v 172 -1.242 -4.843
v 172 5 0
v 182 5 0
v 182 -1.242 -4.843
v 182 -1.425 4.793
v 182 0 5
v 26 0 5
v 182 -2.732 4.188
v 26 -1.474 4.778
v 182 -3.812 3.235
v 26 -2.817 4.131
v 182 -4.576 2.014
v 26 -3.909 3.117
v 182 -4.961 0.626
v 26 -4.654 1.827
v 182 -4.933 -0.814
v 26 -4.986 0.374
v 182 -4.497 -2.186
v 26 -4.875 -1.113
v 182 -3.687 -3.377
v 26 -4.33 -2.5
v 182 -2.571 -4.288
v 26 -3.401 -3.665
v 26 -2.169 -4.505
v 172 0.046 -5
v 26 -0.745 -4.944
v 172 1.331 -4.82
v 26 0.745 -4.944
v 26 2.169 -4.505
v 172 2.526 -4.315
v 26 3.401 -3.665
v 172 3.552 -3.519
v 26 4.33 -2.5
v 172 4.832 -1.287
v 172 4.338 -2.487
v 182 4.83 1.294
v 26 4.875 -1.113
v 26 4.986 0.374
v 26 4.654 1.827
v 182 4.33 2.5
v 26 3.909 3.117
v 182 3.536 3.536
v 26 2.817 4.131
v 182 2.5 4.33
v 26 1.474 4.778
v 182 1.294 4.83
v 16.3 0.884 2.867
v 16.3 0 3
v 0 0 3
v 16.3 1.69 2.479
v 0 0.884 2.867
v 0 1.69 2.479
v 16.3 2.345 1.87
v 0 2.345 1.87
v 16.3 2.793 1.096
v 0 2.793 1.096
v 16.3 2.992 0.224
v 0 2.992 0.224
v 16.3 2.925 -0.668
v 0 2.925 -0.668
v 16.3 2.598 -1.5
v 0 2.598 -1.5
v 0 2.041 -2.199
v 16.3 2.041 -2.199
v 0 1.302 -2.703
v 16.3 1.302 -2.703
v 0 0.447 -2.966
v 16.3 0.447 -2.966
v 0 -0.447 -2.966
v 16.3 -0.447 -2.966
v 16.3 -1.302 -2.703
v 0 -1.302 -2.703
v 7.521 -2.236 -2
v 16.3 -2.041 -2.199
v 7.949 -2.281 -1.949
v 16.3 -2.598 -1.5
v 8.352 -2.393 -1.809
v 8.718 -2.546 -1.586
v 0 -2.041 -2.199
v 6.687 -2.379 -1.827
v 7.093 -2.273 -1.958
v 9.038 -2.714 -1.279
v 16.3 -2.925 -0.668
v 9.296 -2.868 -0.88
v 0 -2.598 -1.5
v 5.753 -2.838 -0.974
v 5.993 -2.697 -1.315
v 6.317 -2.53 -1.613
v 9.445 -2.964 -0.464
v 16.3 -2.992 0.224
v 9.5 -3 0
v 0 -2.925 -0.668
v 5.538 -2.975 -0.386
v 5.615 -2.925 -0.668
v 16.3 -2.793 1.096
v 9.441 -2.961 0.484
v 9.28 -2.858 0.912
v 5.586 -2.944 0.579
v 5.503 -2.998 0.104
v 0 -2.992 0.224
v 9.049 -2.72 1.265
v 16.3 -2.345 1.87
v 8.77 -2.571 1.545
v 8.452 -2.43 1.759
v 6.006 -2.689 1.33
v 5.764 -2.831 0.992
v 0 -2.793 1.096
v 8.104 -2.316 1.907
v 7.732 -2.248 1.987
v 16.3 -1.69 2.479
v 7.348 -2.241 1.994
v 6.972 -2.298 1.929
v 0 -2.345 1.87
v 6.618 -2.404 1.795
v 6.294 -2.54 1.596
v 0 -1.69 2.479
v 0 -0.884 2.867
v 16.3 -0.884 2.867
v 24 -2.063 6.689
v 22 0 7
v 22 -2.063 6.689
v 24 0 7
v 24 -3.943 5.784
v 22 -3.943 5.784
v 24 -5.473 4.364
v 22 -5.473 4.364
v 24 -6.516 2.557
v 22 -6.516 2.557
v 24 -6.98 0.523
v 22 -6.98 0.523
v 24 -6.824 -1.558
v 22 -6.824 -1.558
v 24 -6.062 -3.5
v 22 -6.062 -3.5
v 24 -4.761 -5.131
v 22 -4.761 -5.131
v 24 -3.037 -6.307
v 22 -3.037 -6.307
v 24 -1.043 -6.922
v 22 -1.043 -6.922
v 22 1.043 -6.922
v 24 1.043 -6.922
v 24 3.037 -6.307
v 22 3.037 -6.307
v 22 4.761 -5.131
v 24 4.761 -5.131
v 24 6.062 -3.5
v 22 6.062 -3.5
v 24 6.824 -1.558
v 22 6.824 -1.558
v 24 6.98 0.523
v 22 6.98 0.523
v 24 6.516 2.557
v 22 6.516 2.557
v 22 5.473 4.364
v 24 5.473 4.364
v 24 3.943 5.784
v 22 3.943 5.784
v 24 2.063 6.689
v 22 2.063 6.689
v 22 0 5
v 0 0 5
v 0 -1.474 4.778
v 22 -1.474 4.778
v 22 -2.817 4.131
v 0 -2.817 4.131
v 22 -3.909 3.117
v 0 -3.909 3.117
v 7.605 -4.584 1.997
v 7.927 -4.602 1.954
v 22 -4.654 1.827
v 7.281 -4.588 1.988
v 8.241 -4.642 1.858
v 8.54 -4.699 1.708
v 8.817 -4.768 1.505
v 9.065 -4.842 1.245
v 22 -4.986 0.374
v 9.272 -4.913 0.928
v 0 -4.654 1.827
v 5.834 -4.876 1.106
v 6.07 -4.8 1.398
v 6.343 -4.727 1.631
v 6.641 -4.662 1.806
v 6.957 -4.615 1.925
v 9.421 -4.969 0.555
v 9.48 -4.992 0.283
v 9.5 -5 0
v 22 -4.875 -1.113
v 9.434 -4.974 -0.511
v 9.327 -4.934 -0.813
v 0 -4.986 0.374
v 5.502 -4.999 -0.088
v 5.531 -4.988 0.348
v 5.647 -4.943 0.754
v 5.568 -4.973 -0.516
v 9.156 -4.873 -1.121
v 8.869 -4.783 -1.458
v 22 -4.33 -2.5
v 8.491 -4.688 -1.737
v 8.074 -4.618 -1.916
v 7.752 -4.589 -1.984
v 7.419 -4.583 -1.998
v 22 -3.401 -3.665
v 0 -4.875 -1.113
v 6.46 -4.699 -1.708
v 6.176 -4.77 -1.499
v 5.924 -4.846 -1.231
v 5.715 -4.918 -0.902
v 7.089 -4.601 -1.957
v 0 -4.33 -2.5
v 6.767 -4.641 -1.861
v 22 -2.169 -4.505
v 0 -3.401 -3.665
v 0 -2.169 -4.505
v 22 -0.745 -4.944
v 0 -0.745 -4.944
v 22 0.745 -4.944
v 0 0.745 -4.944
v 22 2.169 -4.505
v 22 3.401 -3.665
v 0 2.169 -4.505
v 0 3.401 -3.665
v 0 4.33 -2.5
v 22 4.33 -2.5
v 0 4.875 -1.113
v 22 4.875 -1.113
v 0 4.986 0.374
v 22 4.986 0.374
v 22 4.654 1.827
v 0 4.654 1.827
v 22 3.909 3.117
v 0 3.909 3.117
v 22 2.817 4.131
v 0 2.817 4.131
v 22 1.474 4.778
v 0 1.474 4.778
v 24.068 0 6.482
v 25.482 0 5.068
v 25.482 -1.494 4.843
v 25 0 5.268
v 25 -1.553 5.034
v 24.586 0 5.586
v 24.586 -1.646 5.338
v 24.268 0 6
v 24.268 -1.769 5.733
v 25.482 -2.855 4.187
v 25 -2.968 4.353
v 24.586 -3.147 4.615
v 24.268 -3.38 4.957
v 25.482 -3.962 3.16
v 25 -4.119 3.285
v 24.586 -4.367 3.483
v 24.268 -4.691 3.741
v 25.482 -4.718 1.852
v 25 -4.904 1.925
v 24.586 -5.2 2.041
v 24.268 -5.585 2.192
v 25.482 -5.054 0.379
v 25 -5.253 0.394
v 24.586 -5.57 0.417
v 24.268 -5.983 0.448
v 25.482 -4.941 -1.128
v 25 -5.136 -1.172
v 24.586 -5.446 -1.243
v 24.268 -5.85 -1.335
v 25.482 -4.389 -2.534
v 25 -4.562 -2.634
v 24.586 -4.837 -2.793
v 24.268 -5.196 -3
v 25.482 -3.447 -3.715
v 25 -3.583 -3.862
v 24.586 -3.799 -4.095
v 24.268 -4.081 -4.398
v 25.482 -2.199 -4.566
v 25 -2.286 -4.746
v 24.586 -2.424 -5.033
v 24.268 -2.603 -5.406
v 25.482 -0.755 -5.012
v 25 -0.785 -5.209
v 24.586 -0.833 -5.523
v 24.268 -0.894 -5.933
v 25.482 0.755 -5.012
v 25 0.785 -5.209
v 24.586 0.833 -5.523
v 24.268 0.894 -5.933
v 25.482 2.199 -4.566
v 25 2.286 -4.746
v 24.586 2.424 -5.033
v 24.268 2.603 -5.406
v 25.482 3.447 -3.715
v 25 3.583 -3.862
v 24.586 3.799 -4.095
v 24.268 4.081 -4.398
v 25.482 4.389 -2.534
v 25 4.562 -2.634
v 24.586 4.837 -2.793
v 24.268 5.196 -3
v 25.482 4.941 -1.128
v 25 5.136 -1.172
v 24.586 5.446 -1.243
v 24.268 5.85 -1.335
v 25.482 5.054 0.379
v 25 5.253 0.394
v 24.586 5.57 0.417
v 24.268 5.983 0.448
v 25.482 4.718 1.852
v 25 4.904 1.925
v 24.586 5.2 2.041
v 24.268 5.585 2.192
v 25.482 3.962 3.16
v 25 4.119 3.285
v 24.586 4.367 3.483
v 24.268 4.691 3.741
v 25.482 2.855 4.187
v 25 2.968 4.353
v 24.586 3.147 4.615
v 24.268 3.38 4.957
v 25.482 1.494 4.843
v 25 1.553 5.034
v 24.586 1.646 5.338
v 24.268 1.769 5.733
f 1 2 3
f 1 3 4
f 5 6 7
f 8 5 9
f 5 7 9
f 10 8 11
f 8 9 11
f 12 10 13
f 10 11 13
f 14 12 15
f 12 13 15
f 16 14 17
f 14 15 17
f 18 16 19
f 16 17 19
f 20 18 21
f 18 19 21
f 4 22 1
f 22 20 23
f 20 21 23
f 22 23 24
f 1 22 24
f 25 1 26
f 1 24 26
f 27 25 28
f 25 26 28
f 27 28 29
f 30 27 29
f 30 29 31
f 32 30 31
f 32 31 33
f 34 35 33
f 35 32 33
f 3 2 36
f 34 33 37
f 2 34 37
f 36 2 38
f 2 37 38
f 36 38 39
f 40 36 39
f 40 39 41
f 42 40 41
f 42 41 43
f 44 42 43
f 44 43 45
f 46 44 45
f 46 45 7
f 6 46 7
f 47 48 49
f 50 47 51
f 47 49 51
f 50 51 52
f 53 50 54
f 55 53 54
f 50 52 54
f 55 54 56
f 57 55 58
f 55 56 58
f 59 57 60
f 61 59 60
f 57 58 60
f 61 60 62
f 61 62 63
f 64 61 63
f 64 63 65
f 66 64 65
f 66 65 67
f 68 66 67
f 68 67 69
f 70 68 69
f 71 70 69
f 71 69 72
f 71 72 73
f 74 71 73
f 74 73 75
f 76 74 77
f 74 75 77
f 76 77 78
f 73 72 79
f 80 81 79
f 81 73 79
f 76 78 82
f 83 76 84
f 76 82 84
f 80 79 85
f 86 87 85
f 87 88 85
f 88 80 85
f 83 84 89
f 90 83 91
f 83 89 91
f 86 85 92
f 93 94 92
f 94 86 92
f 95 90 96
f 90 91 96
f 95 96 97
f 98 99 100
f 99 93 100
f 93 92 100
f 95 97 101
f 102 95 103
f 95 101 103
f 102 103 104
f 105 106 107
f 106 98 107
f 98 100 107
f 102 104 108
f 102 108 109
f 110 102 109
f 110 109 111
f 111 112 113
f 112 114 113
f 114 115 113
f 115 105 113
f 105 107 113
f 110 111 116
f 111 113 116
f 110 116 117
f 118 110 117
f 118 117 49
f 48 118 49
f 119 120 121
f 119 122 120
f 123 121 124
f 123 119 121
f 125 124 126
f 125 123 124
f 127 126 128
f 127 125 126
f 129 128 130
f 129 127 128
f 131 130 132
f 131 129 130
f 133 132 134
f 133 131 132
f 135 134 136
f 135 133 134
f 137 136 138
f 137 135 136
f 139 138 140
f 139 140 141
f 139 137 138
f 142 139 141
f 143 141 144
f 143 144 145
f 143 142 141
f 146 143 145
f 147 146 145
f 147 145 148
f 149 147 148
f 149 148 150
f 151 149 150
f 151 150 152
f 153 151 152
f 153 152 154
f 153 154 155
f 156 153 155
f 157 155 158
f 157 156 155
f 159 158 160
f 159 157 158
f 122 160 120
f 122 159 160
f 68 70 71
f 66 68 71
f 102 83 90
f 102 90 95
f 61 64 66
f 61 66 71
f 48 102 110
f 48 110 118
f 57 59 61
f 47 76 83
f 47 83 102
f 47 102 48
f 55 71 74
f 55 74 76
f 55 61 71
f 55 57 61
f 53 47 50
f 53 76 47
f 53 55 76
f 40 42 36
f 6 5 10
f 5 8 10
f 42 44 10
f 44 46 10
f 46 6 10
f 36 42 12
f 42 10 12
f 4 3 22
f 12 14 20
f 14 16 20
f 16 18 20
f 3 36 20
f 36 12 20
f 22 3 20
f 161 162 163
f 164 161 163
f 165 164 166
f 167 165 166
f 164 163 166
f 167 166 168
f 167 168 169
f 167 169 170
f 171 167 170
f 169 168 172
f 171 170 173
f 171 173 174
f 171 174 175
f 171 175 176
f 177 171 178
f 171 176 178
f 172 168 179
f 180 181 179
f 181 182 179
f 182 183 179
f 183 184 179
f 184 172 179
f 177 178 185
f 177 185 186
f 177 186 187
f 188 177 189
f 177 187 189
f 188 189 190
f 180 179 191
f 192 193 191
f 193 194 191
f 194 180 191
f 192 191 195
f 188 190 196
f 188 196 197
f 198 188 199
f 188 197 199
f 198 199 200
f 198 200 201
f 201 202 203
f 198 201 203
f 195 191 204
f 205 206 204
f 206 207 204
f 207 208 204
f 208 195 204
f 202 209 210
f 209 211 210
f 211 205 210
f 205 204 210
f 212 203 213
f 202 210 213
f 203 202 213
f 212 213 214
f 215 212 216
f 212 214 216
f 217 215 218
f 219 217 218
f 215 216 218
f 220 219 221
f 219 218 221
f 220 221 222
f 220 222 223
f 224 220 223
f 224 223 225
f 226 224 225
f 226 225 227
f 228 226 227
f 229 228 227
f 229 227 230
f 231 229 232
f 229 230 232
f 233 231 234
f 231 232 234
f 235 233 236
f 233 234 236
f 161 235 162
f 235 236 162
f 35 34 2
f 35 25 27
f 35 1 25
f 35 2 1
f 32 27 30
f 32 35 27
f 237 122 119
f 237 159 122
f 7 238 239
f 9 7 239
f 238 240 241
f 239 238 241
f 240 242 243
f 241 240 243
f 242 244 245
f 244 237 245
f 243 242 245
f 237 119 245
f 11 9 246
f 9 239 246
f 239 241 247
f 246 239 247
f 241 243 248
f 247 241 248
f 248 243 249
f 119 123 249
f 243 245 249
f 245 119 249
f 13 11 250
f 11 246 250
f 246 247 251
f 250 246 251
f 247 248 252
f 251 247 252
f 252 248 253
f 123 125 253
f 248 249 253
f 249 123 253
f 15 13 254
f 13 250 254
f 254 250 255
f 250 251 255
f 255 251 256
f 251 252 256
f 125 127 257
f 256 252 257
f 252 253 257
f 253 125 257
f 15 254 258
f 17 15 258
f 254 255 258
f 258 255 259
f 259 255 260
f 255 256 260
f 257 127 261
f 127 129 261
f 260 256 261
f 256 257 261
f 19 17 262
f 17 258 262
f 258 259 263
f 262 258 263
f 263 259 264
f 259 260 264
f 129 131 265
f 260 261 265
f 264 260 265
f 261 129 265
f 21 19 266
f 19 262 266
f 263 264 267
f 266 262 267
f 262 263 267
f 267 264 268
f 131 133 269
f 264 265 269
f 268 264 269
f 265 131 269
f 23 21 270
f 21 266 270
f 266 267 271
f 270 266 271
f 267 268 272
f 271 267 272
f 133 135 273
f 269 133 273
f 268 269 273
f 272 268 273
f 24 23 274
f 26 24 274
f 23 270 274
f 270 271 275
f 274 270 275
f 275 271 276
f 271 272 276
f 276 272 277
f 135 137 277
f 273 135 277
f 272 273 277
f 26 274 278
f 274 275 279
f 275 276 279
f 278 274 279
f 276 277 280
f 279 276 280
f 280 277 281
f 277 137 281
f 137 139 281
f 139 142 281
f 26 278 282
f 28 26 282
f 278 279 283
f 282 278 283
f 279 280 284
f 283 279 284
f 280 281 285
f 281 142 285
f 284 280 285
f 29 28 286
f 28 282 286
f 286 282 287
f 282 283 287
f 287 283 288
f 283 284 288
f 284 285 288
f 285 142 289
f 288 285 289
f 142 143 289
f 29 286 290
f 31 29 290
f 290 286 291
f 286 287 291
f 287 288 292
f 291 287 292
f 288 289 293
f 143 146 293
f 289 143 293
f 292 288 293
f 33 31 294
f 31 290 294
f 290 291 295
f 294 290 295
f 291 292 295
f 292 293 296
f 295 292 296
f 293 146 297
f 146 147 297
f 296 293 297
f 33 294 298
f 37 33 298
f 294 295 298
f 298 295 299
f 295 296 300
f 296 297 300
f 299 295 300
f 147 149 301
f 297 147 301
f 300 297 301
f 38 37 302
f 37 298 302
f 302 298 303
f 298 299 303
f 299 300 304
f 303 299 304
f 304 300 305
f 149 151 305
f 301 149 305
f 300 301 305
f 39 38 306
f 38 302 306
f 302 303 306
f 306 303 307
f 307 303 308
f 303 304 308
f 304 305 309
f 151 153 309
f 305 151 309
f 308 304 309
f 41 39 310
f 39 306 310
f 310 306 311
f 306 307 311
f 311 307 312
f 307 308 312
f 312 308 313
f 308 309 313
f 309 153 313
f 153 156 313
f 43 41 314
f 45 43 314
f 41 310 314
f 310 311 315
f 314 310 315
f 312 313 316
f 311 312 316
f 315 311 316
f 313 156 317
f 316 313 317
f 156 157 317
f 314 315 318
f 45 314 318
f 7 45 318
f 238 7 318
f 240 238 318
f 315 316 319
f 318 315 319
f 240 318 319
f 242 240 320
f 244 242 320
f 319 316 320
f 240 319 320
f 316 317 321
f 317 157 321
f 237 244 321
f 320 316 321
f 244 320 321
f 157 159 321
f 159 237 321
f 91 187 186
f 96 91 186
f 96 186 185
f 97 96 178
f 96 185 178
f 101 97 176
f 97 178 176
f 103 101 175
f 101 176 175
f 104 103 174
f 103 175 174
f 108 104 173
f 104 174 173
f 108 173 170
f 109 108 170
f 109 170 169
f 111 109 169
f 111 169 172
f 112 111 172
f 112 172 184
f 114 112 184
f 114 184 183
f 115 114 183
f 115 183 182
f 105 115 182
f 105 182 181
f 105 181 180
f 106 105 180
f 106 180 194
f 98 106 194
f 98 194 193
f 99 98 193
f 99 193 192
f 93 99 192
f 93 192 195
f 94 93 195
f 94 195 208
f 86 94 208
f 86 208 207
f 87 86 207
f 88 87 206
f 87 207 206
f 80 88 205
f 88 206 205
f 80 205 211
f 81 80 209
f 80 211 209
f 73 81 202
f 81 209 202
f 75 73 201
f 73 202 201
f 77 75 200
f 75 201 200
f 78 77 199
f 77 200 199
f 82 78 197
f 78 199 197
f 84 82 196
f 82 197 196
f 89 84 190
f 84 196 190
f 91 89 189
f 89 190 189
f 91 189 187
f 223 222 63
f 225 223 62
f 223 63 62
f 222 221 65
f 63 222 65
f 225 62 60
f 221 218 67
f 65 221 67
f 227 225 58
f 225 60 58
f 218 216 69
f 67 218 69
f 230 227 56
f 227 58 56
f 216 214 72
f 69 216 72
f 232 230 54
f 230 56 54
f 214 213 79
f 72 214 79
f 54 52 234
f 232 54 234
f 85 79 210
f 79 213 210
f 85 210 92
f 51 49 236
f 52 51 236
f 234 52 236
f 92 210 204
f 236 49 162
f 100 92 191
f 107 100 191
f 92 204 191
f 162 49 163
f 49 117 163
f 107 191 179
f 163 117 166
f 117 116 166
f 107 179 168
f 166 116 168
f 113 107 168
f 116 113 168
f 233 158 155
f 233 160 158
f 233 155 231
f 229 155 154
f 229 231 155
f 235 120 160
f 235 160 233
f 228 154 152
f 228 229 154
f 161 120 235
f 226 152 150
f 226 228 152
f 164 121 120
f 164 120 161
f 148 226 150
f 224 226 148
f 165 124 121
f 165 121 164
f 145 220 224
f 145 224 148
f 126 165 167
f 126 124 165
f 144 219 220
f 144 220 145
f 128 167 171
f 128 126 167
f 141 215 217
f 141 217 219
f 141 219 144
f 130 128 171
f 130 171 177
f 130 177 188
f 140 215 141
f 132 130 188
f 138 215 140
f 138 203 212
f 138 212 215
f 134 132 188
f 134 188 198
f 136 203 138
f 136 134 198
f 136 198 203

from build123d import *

# Parameters (mm, degrees)
ESQUISSE1_W                  = 36
ESQUISSE1_H                  = 5
ESQUISSE1_W_2                = 2
ESQUISSE1_H_2                = 2
CONG_1_R                     = 2
ESQUISSE6_R                  = 2
ENL_V_MAT_EXTRU_2_DEPTH      = 5
ESQUISSE7_R                  = 3
ENL_V_MAT_EXTRU_3_DEPTH      = 16.3
ENL_V_MAT_EXTRU_4_DEPTH      = 183.269032028
ENL_V_MAT_EXTRU_4_DEPTH_BACK = 10


with BuildPart() as part:
    # Esquisse1 → Révolution1 (revolve)
    with BuildSketch(Plane.XY, mode=Mode.PRIVATE) as r_volution1_sk:
        Polygon((0, 5), (0, 0), (146, 0), (146, 5), (24, 5), (22, 5), align=None)
        with Locations((164, 2.5)):
            Rectangle(ESQUISSE1_W, ESQUISSE1_H)
        with Locations((23, 6)):
            Rectangle(ESQUISSE1_W_2, ESQUISSE1_H_2)
    revolve(r_volution1_sk.sketch.rotate(Axis((-22.396751432, 0, 0), (1, 0, 0)), 90), axis=Axis((-22.396751432, 0, 0), (1, 0, 0)))

    # Congé1
    cong_1_edges = [part.edges().sort_by_distance(p)[0] for p in [
        (24, 0, -5),
    ]]
    fillet(cong_1_edges, radius=CONG_1_R - 0.0001)  # a hair under: the kernel refuses the full size

    # Esquisse6 → Enlèv. mat.-Extru.2 (cut)
    with BuildSketch(Plane(origin=(0, -5, 0), x_dir=(-1, 0, 0), z_dir=(0, -1, 0))):
        with Locations(Location((-7.5, 0, 0), (0, 0, 180))):
            Circle(ESQUISSE6_R)
    extrude(amount=-ENL_V_MAT_EXTRU_2_DEPTH, mode=Mode.SUBTRACT)

    # Esquisse7 → Enlèv. mat.-Extru.3 (cut)
    with BuildSketch(Plane.ZY):
        Circle(ESQUISSE7_R)
    extrude(amount=-ENL_V_MAT_EXTRU_3_DEPTH, mode=Mode.SUBTRACT)

    # Esquisse8 → Enlèv. mat.-Extru.4 (cut, two sides: drawn at the far end of the back side and taken through both)
    with BuildSketch(Plane(origin=(182, 0, 0), x_dir=(0, 0, -1), z_dir=(1, 0, 0)).offset(-ENL_V_MAT_EXTRU_4_DEPTH_BACK)):
        Polygon((-23.820180397, 35.700913916), (0, 5), (4.843224662, -1.2422459), (28.663405059, -31.943159816), (90.065232892, 15.697200979), (37.581647435, 83.341274711), align=None)
    extrude(amount=ENL_V_MAT_EXTRU_4_DEPTH + ENL_V_MAT_EXTRU_4_DEPTH_BACK, mode=Mode.SUBTRACT)


solid = part.part
